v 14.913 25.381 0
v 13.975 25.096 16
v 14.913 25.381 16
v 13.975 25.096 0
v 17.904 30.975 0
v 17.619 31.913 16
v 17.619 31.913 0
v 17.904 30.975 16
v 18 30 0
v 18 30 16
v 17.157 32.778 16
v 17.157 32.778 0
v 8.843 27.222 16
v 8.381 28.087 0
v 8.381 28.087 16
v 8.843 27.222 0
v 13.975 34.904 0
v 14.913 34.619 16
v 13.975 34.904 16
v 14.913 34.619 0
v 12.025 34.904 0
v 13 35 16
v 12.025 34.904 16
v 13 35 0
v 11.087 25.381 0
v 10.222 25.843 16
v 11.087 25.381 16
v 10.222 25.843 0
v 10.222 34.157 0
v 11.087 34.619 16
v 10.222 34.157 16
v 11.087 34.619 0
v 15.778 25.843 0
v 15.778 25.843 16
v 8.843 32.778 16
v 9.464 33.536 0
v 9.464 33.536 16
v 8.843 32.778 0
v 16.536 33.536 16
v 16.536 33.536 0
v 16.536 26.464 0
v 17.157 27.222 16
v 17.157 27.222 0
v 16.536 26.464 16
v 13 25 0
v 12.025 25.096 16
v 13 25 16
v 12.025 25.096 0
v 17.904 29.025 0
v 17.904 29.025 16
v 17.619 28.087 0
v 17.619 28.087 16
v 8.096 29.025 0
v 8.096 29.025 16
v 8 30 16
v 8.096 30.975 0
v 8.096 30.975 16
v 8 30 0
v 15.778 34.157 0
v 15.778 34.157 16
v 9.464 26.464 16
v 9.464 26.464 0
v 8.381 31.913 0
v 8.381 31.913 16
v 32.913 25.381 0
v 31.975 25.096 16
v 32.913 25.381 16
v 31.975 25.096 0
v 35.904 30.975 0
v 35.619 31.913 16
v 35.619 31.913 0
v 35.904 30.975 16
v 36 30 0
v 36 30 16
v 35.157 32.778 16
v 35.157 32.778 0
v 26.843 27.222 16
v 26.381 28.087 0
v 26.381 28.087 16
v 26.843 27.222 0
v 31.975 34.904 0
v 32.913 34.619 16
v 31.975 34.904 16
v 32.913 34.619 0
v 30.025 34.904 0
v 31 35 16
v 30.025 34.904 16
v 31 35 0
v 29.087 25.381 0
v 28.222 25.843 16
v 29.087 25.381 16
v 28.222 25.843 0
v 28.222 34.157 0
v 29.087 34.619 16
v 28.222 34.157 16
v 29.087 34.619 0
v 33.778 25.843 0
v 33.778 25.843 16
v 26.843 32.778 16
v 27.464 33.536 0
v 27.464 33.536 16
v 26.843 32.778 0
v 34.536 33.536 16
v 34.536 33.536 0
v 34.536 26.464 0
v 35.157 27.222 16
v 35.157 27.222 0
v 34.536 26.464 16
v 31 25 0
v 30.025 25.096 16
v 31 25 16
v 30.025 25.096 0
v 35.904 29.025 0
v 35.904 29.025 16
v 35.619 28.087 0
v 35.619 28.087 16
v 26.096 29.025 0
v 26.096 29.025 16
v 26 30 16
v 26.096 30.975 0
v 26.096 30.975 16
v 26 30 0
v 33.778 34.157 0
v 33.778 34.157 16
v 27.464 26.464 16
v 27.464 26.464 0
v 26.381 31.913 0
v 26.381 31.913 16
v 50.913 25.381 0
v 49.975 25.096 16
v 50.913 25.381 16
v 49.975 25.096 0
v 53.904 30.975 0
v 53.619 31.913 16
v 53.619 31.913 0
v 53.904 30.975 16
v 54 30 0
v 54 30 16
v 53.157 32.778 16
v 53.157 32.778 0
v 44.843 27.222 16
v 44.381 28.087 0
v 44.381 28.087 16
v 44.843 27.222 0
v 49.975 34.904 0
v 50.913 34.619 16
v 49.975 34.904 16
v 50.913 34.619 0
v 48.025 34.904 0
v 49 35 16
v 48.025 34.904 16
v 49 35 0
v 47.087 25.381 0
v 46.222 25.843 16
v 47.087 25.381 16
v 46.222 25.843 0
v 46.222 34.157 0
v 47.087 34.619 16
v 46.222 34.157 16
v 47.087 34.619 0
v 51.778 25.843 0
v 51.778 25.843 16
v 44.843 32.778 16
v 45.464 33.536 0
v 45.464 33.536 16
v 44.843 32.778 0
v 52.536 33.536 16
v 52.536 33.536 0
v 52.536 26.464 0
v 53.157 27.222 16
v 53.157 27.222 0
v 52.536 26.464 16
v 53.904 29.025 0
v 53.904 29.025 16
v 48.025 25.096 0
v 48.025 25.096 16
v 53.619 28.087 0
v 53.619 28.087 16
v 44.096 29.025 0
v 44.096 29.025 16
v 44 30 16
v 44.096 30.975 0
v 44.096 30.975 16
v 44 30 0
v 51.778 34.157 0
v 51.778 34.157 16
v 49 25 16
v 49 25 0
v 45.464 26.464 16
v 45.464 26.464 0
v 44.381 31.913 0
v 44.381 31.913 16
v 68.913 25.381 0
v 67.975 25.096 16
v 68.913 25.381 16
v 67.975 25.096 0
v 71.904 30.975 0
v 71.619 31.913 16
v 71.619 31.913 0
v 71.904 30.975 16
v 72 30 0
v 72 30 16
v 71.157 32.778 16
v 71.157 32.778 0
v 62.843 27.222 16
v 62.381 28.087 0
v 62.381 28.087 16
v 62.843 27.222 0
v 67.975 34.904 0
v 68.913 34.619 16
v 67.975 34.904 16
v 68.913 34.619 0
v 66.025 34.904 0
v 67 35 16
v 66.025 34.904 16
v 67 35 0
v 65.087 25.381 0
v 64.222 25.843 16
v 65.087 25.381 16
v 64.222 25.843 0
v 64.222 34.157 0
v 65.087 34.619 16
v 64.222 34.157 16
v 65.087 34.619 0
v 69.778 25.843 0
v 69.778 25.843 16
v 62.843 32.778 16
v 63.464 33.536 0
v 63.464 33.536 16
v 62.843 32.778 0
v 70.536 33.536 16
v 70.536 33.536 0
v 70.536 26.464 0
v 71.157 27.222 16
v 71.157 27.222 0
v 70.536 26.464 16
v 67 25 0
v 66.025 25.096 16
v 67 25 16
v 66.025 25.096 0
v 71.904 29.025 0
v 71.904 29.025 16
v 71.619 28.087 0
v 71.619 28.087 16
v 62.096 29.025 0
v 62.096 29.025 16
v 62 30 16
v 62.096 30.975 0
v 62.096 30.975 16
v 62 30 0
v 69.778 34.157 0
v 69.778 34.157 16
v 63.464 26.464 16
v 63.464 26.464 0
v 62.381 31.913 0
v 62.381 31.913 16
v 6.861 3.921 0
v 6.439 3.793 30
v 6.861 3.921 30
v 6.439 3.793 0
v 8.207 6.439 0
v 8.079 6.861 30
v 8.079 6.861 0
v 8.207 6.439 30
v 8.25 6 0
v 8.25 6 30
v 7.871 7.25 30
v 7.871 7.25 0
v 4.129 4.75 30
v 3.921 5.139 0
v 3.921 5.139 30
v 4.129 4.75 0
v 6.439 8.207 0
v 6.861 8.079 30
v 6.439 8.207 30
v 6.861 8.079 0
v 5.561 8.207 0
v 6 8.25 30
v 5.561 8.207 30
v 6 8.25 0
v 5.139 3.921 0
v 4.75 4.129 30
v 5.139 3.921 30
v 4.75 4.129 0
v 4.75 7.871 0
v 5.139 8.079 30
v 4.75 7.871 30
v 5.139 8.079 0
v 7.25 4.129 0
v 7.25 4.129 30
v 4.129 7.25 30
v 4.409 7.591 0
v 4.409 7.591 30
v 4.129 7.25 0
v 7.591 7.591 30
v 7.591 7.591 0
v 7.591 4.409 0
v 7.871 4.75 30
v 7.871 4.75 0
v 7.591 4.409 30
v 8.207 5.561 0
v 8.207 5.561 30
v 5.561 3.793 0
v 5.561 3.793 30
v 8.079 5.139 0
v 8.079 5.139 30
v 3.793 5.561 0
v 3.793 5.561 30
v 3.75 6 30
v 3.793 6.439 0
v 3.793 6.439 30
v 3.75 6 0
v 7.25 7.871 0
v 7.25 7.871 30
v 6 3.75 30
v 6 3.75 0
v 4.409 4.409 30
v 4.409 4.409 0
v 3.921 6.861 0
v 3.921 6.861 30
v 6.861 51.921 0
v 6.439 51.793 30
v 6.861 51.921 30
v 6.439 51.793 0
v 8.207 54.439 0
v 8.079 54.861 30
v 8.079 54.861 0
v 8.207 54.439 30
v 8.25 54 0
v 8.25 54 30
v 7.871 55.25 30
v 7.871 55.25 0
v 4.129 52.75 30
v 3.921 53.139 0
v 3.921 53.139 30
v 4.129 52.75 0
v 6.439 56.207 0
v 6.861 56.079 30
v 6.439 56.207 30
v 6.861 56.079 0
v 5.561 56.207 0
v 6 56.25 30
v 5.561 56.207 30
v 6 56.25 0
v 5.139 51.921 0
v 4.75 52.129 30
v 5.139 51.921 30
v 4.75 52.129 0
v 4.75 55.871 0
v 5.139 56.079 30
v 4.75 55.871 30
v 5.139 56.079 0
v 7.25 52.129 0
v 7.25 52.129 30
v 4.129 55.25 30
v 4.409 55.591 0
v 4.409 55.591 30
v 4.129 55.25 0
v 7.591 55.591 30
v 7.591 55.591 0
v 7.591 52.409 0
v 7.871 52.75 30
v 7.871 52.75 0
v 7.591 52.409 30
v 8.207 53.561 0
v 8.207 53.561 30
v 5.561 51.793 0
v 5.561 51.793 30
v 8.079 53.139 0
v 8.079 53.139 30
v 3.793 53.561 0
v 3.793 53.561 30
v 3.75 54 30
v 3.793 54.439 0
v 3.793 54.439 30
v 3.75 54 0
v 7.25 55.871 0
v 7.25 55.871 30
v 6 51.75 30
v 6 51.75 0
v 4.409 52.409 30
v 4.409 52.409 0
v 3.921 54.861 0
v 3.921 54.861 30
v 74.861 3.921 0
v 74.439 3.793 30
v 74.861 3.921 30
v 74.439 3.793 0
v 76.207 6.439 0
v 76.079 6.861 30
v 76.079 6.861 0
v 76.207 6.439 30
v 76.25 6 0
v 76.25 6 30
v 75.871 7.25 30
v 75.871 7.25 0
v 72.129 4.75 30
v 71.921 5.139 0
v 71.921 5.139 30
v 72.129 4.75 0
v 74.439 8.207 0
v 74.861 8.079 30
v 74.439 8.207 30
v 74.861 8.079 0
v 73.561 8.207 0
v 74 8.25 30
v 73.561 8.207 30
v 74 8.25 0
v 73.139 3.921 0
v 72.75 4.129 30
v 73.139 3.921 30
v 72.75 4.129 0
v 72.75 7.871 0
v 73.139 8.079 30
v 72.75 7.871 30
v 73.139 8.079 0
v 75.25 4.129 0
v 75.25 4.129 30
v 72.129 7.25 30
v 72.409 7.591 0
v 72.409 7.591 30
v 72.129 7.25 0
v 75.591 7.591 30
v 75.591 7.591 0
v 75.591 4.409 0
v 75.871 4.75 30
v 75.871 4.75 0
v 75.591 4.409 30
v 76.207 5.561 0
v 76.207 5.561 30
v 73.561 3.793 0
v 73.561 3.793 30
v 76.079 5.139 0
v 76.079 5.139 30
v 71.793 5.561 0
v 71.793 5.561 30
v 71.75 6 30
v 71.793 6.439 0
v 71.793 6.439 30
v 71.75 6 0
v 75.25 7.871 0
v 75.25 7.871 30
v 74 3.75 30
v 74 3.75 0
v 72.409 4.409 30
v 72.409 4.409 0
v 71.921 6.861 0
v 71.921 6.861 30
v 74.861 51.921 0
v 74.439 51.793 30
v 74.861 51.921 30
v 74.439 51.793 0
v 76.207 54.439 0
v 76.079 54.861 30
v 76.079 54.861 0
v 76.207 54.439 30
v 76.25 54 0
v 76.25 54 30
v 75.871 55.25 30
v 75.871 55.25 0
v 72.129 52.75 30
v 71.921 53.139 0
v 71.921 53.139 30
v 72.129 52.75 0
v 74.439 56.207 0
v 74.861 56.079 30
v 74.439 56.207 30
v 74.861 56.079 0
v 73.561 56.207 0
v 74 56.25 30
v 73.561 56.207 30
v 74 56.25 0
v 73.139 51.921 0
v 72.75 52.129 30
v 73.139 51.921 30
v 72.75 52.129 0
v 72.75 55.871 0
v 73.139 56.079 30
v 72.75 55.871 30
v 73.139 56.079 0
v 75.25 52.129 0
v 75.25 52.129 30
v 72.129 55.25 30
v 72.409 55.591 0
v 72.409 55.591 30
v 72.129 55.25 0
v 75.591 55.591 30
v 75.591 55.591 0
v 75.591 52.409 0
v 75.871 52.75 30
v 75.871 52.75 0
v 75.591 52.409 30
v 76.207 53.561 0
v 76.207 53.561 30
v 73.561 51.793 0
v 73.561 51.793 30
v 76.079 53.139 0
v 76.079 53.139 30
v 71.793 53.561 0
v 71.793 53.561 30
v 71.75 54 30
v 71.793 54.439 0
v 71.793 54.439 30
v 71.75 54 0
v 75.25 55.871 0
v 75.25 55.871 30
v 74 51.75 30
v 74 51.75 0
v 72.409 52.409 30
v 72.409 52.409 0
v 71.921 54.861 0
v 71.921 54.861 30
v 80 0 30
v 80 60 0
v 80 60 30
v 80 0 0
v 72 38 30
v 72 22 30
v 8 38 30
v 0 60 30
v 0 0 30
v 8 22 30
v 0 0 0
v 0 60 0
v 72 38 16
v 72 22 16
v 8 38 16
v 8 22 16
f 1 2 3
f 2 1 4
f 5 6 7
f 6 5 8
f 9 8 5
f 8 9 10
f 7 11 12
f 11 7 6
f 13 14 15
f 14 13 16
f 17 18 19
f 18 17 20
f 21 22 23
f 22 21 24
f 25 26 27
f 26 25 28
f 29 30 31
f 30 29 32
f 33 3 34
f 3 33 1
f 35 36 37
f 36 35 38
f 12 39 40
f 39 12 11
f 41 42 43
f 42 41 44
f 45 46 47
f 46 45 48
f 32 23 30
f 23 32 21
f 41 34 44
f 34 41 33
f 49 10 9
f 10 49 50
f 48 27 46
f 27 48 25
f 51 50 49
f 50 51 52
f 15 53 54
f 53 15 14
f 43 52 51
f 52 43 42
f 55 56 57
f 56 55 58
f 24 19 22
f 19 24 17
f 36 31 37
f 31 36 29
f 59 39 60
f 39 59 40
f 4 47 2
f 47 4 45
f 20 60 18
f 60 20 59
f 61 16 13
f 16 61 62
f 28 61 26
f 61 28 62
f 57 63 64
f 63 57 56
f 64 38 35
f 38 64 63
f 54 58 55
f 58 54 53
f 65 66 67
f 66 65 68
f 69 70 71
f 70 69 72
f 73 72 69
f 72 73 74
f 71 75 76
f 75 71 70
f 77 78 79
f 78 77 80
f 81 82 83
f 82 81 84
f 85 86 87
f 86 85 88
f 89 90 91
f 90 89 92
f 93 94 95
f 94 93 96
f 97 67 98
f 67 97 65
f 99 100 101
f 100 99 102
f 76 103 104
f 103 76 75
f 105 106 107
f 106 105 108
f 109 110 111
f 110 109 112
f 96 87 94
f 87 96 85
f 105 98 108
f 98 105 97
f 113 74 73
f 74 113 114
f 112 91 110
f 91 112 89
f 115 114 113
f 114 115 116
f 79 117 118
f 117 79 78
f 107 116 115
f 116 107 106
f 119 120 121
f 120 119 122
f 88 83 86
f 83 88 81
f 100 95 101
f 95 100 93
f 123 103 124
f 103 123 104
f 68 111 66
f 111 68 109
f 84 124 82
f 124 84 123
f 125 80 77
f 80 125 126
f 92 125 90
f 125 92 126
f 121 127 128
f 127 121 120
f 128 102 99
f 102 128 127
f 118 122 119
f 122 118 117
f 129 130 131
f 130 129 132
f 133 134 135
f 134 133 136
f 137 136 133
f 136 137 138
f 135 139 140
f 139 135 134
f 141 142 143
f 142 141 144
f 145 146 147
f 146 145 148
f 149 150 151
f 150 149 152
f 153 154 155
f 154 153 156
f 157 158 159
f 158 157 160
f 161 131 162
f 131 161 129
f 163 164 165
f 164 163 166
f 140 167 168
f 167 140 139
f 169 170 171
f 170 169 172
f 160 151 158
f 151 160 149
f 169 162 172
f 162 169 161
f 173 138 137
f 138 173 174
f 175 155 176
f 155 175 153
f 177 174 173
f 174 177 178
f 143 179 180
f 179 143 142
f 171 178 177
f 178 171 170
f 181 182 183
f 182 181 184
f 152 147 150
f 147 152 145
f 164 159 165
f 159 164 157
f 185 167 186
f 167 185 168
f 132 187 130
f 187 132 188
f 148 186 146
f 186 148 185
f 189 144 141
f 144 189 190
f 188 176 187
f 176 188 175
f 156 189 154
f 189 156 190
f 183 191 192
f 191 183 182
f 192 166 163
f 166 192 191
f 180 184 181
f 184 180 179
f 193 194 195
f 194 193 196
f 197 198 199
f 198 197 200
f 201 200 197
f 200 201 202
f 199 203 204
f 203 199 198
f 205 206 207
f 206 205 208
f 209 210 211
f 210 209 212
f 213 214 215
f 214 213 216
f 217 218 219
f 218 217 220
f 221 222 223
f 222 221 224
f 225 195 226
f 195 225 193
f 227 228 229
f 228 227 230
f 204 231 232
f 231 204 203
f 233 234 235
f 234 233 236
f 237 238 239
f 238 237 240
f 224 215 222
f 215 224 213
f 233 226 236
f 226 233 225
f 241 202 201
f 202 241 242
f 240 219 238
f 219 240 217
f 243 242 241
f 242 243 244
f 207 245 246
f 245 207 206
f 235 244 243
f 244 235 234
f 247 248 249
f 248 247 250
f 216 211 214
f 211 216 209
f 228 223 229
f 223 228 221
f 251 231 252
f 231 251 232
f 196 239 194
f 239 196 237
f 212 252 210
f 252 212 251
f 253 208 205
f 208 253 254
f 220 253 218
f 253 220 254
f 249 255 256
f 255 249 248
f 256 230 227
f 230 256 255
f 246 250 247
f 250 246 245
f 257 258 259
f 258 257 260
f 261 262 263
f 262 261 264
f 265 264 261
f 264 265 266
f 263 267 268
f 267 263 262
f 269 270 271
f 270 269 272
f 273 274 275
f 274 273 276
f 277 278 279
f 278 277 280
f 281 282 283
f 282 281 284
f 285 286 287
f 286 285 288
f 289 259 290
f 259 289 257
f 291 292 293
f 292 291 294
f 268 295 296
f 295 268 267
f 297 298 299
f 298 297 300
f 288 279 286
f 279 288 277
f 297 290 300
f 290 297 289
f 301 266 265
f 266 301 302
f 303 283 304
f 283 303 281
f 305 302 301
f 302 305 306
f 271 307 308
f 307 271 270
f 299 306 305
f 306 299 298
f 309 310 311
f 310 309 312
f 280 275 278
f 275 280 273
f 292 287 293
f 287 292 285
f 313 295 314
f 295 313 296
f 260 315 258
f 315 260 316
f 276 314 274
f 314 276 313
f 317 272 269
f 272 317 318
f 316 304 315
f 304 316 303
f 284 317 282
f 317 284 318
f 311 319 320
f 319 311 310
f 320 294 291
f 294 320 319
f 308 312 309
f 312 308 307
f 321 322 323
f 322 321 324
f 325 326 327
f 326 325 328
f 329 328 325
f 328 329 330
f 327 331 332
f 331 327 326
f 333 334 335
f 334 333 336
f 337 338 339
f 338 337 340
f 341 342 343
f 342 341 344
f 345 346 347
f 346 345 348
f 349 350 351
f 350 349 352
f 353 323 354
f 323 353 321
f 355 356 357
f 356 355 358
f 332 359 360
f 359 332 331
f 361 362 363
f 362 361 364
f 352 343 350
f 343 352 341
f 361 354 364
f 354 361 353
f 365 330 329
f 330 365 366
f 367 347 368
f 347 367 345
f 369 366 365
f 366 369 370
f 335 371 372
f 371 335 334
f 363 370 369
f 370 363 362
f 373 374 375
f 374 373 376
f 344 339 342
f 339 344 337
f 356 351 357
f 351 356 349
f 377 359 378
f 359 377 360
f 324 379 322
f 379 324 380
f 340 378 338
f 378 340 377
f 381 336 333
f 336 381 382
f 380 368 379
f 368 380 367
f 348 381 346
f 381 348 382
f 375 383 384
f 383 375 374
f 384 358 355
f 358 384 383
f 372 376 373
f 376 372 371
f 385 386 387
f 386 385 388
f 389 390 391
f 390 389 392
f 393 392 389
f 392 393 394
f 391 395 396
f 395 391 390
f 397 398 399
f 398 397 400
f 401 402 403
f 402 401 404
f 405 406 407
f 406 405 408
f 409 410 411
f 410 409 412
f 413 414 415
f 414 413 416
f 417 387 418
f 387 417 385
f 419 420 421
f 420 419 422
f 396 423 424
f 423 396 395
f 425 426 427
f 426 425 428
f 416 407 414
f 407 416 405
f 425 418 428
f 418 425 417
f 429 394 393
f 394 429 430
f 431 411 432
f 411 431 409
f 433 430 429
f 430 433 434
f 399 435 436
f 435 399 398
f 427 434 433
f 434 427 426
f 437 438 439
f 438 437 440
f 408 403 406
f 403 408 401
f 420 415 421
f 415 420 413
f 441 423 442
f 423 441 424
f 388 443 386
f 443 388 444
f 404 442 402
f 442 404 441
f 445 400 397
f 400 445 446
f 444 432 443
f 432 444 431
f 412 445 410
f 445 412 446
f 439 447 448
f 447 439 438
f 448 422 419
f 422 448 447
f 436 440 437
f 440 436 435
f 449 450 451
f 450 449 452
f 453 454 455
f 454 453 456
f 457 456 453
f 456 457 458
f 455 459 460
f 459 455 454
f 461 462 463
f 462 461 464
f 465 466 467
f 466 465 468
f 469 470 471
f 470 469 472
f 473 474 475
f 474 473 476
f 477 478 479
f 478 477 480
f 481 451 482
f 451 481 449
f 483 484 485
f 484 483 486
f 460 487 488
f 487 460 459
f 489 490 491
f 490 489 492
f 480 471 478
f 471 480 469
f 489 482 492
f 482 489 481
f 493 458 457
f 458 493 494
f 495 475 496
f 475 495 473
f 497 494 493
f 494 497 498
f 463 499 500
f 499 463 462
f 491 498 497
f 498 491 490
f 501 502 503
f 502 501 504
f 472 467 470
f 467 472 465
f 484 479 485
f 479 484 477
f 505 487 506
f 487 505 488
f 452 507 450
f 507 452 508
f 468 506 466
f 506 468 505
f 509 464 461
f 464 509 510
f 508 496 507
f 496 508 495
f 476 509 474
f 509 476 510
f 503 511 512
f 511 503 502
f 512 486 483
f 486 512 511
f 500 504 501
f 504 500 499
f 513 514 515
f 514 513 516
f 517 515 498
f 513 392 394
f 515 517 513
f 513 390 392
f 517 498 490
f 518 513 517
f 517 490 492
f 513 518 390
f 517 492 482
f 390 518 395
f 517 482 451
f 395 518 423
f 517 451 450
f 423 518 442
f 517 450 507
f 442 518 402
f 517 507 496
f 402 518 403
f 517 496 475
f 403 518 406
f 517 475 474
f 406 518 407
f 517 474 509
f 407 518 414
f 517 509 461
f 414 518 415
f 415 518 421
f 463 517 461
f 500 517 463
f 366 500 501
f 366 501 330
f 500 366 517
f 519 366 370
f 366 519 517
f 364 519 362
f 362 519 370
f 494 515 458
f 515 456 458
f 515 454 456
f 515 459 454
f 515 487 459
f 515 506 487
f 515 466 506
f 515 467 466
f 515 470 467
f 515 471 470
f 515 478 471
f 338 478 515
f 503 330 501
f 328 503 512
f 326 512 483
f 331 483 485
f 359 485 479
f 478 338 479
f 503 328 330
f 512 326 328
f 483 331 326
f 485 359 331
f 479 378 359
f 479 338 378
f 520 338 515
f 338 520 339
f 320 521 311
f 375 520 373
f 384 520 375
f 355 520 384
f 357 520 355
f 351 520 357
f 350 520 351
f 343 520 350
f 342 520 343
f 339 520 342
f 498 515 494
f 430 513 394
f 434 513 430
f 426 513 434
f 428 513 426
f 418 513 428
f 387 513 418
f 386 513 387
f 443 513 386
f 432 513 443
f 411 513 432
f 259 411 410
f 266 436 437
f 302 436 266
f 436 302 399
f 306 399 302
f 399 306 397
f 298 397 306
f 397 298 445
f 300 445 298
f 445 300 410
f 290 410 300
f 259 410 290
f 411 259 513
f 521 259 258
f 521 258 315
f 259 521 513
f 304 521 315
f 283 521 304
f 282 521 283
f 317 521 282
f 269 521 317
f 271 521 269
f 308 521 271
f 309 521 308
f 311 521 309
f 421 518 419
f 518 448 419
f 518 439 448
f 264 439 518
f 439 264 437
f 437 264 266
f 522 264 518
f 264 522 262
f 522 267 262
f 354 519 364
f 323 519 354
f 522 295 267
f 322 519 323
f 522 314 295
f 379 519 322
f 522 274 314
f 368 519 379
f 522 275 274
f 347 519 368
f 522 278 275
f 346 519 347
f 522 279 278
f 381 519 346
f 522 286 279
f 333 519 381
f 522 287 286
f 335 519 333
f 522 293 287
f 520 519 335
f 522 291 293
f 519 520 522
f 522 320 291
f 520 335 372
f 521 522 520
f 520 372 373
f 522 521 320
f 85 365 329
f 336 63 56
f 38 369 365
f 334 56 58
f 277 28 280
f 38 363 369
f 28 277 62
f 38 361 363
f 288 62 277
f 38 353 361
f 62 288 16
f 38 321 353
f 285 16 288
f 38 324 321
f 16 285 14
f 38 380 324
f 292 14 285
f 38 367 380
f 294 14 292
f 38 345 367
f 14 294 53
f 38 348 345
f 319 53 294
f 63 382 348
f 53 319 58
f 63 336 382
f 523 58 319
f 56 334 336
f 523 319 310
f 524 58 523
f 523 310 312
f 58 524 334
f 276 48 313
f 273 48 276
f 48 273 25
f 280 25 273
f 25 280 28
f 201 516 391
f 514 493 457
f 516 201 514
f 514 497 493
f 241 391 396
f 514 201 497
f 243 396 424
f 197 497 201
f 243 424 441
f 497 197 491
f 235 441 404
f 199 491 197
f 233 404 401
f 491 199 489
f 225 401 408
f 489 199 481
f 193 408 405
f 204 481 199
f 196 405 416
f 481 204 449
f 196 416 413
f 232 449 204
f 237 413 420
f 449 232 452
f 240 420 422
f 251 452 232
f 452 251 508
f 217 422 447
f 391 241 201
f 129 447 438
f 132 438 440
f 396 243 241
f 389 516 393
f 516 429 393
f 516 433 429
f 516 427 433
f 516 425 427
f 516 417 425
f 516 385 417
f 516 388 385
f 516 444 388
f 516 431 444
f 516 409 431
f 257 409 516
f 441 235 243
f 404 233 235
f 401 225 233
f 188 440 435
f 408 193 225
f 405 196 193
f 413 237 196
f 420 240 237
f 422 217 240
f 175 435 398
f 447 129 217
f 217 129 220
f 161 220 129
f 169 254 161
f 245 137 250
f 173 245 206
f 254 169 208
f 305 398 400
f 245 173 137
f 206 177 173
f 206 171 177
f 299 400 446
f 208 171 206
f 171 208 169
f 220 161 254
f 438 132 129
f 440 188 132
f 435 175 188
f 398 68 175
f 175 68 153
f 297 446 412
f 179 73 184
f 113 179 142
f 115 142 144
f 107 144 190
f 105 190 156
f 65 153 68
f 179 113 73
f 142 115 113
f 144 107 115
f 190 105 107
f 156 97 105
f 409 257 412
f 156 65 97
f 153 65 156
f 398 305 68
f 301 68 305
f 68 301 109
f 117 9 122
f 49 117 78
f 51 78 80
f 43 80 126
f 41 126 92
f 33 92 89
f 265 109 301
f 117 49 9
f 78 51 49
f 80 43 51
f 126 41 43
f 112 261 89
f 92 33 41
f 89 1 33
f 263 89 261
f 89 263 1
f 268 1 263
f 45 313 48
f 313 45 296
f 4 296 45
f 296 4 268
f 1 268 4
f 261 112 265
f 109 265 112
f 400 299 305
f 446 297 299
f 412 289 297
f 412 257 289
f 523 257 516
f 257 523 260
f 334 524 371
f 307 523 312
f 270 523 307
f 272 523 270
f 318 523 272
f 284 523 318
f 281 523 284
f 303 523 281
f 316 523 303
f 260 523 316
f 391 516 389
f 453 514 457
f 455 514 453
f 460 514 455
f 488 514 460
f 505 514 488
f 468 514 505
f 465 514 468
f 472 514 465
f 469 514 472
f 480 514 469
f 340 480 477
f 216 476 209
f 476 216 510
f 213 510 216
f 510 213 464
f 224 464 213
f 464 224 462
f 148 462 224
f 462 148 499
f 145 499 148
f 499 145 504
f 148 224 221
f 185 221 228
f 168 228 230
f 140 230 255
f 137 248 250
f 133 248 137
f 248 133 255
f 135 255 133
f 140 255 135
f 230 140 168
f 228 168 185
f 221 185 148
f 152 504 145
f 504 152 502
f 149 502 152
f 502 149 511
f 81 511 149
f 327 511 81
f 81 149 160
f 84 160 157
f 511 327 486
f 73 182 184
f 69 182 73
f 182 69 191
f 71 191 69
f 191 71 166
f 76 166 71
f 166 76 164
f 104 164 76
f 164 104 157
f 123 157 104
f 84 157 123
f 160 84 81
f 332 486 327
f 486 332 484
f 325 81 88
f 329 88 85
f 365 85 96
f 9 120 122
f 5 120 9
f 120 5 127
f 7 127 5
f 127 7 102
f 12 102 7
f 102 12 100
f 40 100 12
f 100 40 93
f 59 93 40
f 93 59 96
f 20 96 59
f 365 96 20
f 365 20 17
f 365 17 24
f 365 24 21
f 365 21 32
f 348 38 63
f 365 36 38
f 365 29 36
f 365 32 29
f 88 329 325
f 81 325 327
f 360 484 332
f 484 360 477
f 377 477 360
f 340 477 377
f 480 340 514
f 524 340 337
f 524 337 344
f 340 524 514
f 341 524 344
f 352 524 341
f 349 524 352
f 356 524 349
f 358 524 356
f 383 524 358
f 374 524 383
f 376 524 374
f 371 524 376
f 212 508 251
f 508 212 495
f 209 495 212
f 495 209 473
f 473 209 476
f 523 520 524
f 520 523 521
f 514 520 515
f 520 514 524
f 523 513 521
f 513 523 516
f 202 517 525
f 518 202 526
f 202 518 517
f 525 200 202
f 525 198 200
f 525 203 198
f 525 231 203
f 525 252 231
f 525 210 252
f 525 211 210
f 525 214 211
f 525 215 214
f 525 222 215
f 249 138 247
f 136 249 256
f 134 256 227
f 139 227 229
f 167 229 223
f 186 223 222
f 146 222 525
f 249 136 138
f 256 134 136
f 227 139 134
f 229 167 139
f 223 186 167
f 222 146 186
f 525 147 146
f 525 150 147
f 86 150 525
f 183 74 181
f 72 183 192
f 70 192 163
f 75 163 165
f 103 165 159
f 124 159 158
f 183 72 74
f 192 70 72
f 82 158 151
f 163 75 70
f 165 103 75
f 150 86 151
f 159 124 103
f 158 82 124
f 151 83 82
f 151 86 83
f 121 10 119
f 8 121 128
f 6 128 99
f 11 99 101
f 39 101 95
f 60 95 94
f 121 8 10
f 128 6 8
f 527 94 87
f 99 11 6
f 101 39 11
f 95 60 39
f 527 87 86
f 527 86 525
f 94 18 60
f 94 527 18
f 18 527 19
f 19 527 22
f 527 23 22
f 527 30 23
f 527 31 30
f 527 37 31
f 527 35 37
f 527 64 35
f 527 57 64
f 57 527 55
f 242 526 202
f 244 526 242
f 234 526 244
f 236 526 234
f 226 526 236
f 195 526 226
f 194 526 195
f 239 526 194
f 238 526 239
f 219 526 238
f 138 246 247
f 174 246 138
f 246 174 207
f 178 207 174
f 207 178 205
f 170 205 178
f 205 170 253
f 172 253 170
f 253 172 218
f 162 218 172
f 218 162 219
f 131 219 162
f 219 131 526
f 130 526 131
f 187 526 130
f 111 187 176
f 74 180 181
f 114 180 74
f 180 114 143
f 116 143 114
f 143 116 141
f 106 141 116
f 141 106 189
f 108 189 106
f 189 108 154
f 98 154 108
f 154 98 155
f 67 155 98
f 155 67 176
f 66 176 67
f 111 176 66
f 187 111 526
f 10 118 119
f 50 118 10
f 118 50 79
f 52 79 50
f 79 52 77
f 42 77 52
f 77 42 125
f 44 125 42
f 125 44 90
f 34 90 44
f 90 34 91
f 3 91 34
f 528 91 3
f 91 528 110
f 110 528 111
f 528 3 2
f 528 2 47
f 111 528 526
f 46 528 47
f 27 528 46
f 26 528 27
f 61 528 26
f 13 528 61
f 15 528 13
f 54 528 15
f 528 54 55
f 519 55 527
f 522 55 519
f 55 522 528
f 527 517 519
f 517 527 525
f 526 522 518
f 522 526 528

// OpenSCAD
$fn = 32;

// ----------------------------------------------------------------------
// Manifold block: gallery_top manifold
// ----------------------------------------------------------------------

// --- parameters (mm) ---
block_l = 80;             // block length, X
block_w = 60;             // block width, Y
block_h = 30;             // block height, Z
port_d = 10;              // port bore diameter
port_pitch = 18;          // port pitch along X
gallery_d = 16;           // top gallery width, Y
gallery_depth = 14;       // gallery pocket depth
wall_p = 8;               // gallery end wall thickness, X
mnt_d = 4.5;              // mounting hole diameter
mnt_in = 6;               // mounting hole inset from the edges

n_ports = 4;  // ports in the row
port_x0 = (block_l - (n_ports - 1) * port_pitch) / 2;  // first port X

difference() {
  cube([block_l, block_w, block_h]);
  for (i = [0 : n_ports - 1])
    translate([port_x0 + i * port_pitch, block_w / 2, -1])
      cylinder(h = block_h + 2, d = port_d);
  translate([wall_p, block_w / 2 - gallery_d / 2, block_h - gallery_depth])
    cube([block_l - 2 * wall_p, gallery_d, gallery_depth + 1]);
  for (cx = [mnt_in, block_l - mnt_in])
    for (cy = [mnt_in, block_w - mnt_in])
      translate([cx, cy, -1]) cylinder(h = block_h + 2, d = mnt_d);
}
